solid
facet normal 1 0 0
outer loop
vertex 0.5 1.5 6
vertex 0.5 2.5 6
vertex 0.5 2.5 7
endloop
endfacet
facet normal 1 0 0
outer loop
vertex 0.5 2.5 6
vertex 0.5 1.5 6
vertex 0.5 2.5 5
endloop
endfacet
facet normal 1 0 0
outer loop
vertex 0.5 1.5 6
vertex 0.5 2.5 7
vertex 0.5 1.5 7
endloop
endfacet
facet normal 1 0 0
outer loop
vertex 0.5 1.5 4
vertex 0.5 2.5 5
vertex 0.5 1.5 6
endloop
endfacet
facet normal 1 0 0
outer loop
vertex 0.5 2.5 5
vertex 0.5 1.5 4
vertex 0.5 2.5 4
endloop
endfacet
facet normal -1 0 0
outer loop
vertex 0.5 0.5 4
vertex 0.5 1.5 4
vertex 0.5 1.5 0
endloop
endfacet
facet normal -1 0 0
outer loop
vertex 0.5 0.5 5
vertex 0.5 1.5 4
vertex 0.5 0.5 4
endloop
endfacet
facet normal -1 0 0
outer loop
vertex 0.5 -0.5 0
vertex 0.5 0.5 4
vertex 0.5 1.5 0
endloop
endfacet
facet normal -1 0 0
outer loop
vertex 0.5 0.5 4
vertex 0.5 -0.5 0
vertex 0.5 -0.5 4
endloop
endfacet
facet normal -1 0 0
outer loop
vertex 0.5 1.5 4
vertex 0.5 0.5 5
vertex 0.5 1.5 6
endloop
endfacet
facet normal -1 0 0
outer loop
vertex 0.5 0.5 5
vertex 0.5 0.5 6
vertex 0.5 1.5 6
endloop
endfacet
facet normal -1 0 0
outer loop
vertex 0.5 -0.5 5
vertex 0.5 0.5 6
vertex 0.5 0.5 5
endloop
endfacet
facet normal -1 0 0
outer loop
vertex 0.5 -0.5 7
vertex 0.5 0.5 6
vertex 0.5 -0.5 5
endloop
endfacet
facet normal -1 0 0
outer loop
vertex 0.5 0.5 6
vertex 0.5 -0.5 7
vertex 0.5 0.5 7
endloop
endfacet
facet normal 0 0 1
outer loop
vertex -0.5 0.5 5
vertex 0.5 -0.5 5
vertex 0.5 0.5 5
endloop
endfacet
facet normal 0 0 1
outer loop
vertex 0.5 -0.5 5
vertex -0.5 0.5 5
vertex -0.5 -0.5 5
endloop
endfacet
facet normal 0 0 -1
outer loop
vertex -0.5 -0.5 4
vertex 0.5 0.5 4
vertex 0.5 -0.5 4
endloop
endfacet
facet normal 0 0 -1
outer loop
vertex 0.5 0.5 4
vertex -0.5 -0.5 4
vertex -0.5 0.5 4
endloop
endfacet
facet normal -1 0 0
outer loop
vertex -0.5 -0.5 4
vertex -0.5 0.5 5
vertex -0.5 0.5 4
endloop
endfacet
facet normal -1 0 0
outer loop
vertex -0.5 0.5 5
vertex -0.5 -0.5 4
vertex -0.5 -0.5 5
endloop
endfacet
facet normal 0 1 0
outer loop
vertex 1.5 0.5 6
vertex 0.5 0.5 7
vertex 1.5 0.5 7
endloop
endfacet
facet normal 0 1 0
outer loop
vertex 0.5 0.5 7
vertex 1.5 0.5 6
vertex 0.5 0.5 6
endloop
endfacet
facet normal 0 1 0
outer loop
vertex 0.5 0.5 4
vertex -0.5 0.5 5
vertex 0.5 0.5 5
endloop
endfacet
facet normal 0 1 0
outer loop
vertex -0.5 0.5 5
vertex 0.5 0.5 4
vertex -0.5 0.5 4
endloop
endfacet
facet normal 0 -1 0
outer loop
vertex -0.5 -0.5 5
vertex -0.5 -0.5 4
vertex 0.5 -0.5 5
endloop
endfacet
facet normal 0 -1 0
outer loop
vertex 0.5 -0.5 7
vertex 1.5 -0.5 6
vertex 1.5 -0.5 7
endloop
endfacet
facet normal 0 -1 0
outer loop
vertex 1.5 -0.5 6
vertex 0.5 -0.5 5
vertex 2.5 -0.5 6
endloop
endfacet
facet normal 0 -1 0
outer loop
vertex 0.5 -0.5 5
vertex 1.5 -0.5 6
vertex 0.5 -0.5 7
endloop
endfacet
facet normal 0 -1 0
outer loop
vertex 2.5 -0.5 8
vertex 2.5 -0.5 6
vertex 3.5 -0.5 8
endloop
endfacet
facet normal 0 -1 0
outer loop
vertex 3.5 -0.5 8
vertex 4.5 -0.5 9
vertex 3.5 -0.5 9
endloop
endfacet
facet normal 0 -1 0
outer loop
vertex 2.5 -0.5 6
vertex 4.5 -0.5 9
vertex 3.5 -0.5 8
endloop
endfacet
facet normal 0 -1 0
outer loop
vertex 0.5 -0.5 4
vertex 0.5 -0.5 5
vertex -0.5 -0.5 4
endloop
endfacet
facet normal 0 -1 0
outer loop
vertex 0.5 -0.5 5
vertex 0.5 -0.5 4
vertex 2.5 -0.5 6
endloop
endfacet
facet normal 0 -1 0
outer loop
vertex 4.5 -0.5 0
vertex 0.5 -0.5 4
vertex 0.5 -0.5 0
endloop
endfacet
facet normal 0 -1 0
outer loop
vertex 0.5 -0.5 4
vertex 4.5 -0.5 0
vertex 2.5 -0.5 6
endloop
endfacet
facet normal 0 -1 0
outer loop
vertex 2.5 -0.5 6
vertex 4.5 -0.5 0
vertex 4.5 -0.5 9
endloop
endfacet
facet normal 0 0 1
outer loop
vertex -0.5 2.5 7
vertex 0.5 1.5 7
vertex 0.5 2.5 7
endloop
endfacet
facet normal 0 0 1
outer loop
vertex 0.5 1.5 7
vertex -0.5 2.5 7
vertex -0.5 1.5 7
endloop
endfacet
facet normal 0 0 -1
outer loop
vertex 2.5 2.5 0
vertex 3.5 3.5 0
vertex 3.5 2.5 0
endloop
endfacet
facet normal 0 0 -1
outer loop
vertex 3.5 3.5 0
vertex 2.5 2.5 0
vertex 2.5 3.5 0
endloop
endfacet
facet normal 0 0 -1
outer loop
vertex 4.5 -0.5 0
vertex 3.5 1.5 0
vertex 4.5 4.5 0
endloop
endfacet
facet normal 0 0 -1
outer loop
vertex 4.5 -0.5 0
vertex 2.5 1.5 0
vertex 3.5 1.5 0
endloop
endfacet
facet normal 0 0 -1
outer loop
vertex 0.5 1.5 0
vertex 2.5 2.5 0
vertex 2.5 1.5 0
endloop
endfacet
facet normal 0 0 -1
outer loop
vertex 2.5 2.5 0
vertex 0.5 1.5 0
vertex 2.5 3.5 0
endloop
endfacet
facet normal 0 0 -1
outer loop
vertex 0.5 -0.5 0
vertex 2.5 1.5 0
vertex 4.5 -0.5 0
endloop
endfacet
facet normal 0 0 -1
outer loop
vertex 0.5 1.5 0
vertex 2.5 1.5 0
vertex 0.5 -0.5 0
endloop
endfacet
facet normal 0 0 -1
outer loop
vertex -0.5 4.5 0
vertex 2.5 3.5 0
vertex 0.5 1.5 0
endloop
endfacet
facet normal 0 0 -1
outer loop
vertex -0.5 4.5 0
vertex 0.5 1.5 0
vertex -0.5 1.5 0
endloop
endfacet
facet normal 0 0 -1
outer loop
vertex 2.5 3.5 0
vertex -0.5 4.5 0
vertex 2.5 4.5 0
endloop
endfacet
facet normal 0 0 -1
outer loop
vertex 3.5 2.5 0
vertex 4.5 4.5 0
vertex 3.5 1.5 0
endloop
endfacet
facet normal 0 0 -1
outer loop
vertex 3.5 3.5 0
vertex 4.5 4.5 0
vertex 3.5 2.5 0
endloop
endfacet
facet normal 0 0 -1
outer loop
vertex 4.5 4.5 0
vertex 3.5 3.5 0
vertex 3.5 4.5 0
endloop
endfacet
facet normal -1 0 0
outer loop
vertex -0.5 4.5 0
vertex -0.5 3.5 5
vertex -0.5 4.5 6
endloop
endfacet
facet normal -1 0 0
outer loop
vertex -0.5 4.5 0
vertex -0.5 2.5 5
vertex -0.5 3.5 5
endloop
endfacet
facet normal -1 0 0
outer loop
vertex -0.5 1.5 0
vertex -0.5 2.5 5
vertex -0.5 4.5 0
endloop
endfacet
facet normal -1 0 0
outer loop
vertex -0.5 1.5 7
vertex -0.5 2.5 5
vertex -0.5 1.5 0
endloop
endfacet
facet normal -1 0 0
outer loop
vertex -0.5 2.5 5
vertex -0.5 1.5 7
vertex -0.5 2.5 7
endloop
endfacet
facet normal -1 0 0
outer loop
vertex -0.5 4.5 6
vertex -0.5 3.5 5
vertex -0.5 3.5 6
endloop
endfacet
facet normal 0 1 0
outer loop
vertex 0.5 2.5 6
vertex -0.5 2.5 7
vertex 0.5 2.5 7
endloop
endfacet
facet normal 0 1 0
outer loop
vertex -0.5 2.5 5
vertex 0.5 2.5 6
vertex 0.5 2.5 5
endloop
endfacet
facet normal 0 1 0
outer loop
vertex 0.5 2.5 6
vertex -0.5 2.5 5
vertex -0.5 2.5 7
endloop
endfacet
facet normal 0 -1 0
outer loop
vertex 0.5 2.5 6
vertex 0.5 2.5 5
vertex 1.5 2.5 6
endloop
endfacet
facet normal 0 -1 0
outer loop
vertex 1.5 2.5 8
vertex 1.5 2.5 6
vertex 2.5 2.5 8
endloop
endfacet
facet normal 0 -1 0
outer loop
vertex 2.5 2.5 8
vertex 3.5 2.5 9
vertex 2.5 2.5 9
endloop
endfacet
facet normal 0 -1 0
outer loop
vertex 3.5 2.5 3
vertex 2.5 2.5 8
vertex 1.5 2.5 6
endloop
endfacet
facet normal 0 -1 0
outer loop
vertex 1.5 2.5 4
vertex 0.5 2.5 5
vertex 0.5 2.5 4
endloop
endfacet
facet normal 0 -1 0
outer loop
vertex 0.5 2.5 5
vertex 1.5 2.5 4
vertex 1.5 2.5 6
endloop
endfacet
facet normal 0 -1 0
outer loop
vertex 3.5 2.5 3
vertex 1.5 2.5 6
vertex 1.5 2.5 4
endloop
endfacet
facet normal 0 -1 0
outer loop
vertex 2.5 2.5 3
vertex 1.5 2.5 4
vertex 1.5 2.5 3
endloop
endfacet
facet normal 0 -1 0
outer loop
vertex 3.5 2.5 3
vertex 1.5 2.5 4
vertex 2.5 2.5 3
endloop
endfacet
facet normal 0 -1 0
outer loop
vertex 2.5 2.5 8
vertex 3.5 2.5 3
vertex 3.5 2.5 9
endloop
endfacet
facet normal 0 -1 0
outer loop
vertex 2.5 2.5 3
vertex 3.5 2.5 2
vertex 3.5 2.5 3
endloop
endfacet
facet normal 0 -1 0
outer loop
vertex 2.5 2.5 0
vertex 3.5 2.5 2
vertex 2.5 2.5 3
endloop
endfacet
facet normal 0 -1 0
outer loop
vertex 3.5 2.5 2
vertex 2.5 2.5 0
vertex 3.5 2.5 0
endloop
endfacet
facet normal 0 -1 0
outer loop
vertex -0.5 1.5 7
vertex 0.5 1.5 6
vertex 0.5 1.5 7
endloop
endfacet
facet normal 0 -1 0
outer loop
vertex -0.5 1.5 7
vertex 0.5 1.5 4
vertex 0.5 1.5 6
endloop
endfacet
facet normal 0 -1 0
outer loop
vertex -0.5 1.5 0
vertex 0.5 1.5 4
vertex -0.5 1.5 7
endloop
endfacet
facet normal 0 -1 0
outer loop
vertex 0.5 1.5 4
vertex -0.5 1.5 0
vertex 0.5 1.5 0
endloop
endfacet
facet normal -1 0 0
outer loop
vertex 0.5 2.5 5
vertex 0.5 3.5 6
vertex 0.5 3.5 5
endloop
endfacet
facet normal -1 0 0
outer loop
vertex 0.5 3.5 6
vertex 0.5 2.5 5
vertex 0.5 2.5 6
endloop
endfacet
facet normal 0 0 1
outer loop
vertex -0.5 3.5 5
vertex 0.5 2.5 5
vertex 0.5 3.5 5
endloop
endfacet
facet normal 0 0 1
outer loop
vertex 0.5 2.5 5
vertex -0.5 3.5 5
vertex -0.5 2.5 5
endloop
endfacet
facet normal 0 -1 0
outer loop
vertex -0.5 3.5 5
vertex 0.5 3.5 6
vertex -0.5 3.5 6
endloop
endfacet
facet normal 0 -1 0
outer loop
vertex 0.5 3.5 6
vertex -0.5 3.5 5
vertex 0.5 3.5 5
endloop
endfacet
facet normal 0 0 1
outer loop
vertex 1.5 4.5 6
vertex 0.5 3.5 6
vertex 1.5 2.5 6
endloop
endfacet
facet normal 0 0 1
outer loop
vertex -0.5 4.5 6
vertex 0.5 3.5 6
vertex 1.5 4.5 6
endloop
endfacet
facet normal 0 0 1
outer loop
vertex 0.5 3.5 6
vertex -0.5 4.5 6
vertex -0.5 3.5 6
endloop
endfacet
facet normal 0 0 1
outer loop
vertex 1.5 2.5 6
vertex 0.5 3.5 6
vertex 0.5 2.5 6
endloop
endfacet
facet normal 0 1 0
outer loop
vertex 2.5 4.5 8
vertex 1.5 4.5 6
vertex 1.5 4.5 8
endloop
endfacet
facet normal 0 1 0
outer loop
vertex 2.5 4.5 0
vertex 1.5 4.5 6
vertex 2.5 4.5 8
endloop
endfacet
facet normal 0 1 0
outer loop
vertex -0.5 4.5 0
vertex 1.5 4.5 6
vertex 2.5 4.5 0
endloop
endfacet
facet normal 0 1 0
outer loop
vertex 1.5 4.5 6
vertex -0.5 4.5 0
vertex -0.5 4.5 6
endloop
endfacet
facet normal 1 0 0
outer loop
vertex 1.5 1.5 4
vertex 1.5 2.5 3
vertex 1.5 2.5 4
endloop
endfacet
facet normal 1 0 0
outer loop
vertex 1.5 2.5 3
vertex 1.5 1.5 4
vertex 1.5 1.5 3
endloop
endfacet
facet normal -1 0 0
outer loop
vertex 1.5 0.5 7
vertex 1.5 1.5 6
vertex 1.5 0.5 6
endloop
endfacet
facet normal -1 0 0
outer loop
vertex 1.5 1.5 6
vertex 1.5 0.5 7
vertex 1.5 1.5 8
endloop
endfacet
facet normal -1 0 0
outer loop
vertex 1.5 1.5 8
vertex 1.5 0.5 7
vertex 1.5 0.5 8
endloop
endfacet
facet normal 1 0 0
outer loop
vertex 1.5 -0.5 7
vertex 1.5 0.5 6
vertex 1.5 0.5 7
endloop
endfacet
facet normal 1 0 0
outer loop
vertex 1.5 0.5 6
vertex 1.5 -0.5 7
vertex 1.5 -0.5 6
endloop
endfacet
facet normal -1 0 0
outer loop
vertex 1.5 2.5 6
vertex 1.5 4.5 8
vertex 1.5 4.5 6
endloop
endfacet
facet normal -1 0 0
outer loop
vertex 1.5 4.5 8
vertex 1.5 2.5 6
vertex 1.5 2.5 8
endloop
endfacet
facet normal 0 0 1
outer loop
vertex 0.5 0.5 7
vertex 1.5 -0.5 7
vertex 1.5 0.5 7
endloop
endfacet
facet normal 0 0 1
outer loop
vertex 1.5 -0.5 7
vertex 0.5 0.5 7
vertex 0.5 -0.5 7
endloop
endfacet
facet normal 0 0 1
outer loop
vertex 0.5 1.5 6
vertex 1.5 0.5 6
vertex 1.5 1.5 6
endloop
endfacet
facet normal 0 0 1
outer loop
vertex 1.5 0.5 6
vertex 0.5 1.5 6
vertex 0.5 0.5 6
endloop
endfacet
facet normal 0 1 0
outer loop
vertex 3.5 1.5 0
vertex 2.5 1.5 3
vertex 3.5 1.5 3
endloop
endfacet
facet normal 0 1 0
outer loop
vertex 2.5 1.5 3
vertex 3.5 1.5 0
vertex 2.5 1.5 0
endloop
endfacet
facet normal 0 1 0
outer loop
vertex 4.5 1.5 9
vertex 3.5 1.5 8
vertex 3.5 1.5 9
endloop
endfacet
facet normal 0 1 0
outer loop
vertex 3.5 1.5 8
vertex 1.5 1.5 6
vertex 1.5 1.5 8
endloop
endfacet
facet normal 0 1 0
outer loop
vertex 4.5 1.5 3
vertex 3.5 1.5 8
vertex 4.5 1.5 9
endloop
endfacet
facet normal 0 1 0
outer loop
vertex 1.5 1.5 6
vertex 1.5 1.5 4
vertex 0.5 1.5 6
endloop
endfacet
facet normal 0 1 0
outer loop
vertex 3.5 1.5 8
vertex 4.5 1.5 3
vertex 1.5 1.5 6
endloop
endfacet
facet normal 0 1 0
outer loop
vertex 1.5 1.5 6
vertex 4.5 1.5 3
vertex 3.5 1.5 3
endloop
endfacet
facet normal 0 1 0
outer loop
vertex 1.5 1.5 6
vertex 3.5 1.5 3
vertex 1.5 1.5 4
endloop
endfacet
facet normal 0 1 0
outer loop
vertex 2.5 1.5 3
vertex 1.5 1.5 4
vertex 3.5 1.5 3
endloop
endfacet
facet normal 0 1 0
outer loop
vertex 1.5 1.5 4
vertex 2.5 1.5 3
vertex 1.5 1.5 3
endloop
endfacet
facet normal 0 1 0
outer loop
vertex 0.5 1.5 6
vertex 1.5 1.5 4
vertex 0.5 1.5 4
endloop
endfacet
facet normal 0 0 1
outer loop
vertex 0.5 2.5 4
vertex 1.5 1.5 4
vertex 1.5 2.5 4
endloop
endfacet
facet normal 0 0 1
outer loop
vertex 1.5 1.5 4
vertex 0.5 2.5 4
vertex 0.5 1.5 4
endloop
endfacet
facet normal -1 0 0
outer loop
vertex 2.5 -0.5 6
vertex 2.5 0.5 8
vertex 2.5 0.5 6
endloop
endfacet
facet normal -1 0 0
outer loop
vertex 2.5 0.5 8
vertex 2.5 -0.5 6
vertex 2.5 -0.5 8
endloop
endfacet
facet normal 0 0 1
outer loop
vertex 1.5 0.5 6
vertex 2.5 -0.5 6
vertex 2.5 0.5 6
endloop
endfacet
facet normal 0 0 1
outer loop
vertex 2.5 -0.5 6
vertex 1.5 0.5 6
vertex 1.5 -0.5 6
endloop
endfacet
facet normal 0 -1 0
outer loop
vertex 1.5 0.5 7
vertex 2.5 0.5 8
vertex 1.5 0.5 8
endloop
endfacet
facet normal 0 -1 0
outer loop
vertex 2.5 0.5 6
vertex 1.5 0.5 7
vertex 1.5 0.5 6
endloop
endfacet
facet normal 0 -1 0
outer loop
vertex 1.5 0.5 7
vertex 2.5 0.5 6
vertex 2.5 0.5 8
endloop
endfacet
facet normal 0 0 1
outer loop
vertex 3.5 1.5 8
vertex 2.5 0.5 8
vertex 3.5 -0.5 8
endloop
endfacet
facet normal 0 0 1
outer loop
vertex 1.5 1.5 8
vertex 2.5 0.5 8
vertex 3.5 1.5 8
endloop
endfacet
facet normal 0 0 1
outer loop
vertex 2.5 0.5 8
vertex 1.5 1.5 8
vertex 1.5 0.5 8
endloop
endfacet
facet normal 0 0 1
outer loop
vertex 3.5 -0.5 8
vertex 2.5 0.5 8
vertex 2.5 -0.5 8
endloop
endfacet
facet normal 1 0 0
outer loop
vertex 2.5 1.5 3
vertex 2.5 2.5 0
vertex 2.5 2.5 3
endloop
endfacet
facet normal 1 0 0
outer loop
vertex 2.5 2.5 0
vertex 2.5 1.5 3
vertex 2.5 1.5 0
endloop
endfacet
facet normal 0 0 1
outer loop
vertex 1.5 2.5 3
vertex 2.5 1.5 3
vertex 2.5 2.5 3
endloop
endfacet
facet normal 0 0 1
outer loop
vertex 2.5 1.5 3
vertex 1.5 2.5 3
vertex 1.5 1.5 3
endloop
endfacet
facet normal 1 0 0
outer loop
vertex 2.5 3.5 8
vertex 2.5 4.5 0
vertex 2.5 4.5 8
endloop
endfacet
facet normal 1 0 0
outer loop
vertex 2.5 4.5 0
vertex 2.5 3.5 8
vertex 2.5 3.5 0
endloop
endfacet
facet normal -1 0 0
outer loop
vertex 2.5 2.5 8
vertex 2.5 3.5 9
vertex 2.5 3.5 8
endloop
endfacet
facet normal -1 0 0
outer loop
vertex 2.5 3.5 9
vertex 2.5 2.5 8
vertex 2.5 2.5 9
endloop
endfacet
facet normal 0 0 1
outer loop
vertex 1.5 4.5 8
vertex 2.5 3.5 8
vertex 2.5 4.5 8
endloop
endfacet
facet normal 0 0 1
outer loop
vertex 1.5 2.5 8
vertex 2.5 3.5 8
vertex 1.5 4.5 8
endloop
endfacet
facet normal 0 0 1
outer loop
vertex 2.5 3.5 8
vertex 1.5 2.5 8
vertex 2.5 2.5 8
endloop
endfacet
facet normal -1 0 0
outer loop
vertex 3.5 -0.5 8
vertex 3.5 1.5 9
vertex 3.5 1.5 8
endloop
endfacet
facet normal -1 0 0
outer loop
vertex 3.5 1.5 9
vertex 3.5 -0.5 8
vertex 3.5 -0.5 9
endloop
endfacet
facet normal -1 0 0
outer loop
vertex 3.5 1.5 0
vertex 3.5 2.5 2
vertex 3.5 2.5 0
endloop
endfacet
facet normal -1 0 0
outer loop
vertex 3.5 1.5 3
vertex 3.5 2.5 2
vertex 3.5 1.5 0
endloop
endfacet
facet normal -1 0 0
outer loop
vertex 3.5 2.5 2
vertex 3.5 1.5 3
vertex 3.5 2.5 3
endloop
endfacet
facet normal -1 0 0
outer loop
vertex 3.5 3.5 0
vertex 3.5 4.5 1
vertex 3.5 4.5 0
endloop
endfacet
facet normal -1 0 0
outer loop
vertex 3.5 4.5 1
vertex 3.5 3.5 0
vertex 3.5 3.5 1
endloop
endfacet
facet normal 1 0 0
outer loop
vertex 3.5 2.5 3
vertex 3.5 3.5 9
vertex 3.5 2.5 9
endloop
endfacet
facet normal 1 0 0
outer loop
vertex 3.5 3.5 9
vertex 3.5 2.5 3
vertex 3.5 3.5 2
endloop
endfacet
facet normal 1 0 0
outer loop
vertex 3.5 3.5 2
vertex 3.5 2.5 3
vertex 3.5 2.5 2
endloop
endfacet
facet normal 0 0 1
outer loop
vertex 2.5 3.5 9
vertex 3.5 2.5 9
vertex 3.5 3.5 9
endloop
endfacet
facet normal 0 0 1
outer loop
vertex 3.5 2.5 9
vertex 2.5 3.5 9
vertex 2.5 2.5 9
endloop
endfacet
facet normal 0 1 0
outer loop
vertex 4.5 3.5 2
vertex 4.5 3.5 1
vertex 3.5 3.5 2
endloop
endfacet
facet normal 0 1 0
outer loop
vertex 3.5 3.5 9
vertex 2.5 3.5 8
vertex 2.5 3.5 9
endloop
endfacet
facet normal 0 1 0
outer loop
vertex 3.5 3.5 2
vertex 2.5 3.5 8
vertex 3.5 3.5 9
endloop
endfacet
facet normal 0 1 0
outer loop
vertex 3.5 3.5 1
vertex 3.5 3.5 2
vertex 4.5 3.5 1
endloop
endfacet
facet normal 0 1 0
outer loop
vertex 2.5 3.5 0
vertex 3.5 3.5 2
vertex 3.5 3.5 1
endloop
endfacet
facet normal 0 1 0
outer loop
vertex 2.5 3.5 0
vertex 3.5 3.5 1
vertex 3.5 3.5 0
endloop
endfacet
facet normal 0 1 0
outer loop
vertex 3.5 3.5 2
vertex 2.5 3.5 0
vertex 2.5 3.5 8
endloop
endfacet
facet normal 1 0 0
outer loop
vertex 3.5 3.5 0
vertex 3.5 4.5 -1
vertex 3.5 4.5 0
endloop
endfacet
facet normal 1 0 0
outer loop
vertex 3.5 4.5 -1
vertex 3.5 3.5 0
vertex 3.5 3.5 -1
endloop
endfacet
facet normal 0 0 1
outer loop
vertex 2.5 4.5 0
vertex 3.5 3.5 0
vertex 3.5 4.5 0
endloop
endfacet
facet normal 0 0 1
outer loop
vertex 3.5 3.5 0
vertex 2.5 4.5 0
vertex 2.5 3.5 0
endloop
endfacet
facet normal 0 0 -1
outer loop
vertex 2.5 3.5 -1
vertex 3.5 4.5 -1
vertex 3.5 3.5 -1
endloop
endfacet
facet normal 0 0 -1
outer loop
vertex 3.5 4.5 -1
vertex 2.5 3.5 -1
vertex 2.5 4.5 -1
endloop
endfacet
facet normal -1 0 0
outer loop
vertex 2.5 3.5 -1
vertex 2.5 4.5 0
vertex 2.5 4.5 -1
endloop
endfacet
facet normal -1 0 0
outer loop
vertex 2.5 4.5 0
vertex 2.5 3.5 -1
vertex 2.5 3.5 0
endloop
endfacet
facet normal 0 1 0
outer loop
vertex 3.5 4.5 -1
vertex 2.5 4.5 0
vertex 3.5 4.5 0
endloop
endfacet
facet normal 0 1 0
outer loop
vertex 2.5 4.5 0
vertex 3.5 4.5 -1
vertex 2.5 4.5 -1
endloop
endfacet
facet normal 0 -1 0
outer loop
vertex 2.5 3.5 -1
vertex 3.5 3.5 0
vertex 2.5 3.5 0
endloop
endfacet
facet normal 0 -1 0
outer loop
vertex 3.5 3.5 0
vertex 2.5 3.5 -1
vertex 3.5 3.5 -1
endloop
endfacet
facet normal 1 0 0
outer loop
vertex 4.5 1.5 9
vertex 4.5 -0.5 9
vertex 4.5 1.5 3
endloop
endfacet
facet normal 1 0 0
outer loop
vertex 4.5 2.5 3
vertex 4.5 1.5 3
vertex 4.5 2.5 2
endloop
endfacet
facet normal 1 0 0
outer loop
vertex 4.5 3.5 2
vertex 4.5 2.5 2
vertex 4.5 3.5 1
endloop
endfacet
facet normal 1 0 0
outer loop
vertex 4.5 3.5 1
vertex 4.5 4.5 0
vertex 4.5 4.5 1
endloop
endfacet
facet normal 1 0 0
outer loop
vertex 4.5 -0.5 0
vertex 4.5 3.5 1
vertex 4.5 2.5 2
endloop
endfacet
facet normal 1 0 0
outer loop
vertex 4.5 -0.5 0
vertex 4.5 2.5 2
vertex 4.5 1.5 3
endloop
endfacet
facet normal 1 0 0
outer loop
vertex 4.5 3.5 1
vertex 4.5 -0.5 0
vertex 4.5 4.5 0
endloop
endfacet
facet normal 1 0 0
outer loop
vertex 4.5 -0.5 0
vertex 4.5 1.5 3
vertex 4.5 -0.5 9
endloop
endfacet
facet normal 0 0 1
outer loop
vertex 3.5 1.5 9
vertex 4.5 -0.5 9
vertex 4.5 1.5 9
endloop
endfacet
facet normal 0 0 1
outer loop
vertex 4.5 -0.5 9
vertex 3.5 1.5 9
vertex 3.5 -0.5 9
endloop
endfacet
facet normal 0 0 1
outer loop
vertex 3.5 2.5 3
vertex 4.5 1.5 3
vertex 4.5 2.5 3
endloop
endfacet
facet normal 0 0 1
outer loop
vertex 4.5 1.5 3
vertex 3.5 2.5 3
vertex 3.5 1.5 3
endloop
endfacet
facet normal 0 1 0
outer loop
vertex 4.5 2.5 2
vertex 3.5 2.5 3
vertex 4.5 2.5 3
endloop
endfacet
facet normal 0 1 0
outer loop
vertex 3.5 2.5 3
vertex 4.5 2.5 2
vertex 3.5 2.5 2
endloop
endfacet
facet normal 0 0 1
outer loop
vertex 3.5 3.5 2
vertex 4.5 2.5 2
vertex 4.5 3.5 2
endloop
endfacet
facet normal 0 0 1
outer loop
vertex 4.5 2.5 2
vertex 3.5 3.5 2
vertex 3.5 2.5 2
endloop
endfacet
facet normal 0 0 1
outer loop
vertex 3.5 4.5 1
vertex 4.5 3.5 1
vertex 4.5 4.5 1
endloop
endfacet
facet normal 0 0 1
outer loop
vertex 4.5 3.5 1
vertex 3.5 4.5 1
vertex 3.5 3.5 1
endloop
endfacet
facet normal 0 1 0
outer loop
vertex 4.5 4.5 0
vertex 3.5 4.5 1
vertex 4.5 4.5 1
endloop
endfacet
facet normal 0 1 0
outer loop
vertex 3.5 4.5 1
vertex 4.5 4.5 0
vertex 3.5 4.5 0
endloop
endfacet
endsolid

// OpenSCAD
union() {
    translate([0, 0, 4.5]) color([1, 0, 0]) cube([1, 1, 1], center=true);
    translate([0, 2, 3.5]) cube([1, 1, 7], center=true);
    translate([0, 3, 2.5]) cube([1, 1, 5], center=true);
    translate([0, 4, 3.0]) cube([1, 1, 6], center=true);
    translate([1, 0, 3.5]) cube([1, 1, 7], center=true);
    translate([1, 1, 3.0]) cube([1, 1, 6], center=true);
    translate([1, 2, 2.0]) cube([1, 1, 4], center=true);
    translate([1, 3, 3.0]) cube([1, 1, 6], center=true);
    translate([1, 4, 3.0]) cube([1, 1, 6], center=true);
    translate([2, 0, 3.0]) cube([1, 1, 6], center=true);
    translate([2, 1, 4.0]) cube([1, 1, 8], center=true);
    translate([2, 2, 1.5]) cube([1, 1, 3], center=true);
    translate([2, 3, 4.0]) cube([1, 1, 8], center=true);
    translate([2, 4, 4.0]) cube([1, 1, 8], center=true);
    translate([3, 0, 4.0]) cube([1, 1, 8], center=true);
    translate([3, 1, 4.0]) cube([1, 1, 8], center=true);
    translate([3, 3, 4.5]) cube([1, 1, 9], center=true);
    translate([3, 4, -0.5]) color([0, 0, 1]) cube([1, 1, 1], center=true);
    translate([4, 0, 4.5]) cube([1, 1, 9], center=true);
    translate([4, 1, 4.5]) cube([1, 1, 9], center=true);
    translate([4, 2, 1.5]) cube([1, 1, 3], center=true);
    translate([4, 3, 1.0]) cube([1, 1, 2], center=true);
    translate([4, 4, 0.5]) cube([1, 1, 1], center=true);
}
